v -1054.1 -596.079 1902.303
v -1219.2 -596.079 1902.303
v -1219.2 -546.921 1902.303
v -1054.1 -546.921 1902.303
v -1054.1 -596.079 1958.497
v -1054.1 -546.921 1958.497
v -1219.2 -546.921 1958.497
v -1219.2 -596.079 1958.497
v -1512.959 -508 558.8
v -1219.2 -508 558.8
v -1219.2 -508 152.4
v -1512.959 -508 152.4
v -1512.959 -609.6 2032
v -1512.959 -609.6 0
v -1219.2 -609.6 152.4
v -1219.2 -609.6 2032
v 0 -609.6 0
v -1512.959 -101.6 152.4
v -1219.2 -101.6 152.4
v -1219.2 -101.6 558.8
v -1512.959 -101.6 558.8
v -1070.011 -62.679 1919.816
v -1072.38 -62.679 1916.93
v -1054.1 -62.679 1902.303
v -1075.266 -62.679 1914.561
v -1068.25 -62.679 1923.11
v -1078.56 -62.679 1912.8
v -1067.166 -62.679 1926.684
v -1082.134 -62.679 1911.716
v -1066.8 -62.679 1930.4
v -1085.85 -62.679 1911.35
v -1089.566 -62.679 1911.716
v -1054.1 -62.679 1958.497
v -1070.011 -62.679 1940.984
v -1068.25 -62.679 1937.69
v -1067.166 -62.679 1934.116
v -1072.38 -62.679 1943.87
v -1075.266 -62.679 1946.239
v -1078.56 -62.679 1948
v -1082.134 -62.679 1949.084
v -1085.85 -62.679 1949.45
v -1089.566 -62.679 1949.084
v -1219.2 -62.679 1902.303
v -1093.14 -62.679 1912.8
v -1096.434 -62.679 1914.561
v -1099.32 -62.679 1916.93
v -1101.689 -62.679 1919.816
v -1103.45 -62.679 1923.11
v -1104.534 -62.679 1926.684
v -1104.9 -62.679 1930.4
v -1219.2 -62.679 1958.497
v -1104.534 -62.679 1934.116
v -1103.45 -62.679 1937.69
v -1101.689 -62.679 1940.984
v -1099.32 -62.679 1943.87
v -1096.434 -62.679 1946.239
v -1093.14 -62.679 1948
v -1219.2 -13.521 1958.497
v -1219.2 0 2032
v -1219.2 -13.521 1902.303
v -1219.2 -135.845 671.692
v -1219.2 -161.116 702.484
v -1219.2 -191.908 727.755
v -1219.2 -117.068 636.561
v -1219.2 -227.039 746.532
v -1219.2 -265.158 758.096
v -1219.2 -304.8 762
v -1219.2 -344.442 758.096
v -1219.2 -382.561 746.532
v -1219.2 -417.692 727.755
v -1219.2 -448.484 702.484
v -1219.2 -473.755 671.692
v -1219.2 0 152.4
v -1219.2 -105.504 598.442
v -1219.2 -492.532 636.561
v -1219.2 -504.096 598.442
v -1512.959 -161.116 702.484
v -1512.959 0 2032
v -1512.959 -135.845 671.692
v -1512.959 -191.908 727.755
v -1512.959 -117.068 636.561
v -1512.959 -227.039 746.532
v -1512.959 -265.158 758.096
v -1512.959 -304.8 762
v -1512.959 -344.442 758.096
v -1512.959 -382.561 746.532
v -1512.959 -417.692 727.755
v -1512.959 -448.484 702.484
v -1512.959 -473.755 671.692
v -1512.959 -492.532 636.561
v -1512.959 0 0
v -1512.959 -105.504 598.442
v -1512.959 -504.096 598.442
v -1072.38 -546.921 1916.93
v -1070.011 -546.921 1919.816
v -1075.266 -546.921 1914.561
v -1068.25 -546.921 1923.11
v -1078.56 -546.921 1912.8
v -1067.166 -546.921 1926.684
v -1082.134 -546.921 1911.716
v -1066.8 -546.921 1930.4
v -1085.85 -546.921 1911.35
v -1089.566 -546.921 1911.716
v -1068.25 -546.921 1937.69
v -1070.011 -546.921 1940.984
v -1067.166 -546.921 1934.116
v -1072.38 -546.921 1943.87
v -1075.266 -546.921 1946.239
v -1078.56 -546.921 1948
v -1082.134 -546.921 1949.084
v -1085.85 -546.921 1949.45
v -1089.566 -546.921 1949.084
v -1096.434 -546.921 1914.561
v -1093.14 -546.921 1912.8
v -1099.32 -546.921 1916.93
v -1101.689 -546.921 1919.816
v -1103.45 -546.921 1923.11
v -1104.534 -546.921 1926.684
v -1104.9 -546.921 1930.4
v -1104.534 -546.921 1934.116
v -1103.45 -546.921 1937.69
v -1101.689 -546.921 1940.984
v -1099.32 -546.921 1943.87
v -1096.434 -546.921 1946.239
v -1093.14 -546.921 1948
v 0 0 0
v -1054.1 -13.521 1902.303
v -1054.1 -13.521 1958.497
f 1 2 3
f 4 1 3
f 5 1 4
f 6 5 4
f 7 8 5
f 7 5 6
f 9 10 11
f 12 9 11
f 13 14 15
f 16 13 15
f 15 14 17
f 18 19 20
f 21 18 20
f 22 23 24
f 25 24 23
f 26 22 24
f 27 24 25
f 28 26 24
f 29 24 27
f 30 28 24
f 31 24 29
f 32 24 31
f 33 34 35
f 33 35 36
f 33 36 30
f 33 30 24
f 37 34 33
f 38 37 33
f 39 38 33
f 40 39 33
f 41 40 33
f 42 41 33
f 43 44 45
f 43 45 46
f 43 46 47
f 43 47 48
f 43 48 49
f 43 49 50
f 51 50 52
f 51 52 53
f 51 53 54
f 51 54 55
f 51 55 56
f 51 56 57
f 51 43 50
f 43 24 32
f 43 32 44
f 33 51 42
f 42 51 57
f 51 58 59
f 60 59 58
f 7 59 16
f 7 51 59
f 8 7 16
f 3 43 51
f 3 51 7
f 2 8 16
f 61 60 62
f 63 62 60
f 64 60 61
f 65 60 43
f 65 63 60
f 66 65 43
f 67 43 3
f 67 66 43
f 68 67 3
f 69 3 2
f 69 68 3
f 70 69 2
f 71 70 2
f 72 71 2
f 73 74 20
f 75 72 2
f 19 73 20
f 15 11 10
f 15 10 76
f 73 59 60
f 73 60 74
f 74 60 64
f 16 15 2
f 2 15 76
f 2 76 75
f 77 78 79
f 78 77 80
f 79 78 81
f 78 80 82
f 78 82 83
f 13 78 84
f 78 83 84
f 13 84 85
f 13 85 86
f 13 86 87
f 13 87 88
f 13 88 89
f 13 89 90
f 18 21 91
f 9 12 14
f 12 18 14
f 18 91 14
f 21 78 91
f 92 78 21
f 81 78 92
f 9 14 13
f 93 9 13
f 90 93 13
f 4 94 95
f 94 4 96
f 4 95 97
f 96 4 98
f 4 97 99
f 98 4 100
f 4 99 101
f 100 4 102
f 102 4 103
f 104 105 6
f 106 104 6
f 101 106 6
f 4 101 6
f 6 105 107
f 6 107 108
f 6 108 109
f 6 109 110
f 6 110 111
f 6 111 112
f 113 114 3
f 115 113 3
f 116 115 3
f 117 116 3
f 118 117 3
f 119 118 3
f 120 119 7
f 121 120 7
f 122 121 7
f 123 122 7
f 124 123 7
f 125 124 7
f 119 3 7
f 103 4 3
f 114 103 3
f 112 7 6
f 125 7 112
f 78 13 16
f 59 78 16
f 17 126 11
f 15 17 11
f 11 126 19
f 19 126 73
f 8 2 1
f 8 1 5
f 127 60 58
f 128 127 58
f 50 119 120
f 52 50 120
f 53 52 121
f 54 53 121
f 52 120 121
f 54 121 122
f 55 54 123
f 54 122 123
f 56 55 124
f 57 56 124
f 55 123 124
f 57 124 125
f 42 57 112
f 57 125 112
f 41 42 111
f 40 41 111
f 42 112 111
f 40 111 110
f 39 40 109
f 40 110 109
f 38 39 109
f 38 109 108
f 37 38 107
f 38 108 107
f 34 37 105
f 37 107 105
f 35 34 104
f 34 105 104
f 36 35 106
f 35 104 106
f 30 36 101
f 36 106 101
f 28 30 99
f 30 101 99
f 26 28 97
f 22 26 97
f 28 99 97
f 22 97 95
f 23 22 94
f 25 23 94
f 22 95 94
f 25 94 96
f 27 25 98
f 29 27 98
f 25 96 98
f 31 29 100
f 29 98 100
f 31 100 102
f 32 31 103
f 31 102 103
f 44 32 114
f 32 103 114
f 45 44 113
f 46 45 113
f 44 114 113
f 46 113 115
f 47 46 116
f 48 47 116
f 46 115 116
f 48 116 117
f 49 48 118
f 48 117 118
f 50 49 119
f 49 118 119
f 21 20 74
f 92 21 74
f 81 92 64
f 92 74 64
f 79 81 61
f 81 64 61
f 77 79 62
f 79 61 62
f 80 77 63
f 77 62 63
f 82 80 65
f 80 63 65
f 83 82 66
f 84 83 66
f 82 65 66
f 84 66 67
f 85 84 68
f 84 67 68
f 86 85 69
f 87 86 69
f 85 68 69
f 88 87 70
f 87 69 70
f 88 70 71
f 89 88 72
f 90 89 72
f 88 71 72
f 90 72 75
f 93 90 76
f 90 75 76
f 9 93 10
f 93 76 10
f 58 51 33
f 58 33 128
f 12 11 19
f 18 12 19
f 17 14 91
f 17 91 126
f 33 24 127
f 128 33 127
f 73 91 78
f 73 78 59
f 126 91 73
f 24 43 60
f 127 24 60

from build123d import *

# Parameters (mm, degrees)
F1_DEPTH = 609.6
F2_W     = 293.7587650299
F2_H     = 609.6
F3_DEPTH = 2032
F4_W     = 49.1579873383
F4_H     = 56.1940948486
F5_DEPTH = 165.1
F6_R     = 19.05
F7_DEPTH = 484.2420126617
F9_DEPTH = 293.7587650299


with BuildPart() as f1:
    # F0 (on Front) → F1 (new body)
    with BuildSketch(Plane.XZ):
        Polygon((-1219.2, 0), (0, 0), (-1219.2, 152.4), align=None)
    extrude(amount=F1_DEPTH)

    # F2 (on face) → F3 (join)
    with BuildSketch(Plane(origin=(0, 0, 0), x_dir=(1, 0, 0), z_dir=(0, 0, -1))):
        with Locations((-1366.079382515, 304.8)):
            Rectangle(F2_W, F2_H)
    extrude(amount=-F3_DEPTH)

    # F4 (on face) → F5 (join)
    with BuildSketch(Plane.YZ.offset(-1219.2)):
        with Locations((-571.5, 1930.4)):
            Rectangle(F4_W, F4_H)
        with Locations((-38.1, 1930.4)):
            Rectangle(F4_W, F4_H)
    extrude(amount=F5_DEPTH)

    # F6 (on face) → F7 (join, through all)
    with BuildSketch(Plane(origin=(0, -546.9210063308, 0), x_dir=(-1, 0, 0), z_dir=(0, 1, 0))):
        with Locations((1085.85, 1930.4)):
            Circle(F6_R)
    extrude(amount=F7_DEPTH)

    # F8 (on face) → F9 (cut, through all)
    with BuildSketch(Plane.YZ.offset(-1219.2)):
        with BuildLine():
            Line((-508, 558.8), (-508, 152.4))
            Line((-508, 152.4), (-101.6, 152.4))
            Line((-101.6, 152.4), (-101.6, 558.8))
            ThreePointArc((-101.6, 558.8), (-304.8, 762), (-508, 558.8))
        make_face()
    extrude(amount=-F9_DEPTH, mode=Mode.SUBTRACT)


solid = f1.part
